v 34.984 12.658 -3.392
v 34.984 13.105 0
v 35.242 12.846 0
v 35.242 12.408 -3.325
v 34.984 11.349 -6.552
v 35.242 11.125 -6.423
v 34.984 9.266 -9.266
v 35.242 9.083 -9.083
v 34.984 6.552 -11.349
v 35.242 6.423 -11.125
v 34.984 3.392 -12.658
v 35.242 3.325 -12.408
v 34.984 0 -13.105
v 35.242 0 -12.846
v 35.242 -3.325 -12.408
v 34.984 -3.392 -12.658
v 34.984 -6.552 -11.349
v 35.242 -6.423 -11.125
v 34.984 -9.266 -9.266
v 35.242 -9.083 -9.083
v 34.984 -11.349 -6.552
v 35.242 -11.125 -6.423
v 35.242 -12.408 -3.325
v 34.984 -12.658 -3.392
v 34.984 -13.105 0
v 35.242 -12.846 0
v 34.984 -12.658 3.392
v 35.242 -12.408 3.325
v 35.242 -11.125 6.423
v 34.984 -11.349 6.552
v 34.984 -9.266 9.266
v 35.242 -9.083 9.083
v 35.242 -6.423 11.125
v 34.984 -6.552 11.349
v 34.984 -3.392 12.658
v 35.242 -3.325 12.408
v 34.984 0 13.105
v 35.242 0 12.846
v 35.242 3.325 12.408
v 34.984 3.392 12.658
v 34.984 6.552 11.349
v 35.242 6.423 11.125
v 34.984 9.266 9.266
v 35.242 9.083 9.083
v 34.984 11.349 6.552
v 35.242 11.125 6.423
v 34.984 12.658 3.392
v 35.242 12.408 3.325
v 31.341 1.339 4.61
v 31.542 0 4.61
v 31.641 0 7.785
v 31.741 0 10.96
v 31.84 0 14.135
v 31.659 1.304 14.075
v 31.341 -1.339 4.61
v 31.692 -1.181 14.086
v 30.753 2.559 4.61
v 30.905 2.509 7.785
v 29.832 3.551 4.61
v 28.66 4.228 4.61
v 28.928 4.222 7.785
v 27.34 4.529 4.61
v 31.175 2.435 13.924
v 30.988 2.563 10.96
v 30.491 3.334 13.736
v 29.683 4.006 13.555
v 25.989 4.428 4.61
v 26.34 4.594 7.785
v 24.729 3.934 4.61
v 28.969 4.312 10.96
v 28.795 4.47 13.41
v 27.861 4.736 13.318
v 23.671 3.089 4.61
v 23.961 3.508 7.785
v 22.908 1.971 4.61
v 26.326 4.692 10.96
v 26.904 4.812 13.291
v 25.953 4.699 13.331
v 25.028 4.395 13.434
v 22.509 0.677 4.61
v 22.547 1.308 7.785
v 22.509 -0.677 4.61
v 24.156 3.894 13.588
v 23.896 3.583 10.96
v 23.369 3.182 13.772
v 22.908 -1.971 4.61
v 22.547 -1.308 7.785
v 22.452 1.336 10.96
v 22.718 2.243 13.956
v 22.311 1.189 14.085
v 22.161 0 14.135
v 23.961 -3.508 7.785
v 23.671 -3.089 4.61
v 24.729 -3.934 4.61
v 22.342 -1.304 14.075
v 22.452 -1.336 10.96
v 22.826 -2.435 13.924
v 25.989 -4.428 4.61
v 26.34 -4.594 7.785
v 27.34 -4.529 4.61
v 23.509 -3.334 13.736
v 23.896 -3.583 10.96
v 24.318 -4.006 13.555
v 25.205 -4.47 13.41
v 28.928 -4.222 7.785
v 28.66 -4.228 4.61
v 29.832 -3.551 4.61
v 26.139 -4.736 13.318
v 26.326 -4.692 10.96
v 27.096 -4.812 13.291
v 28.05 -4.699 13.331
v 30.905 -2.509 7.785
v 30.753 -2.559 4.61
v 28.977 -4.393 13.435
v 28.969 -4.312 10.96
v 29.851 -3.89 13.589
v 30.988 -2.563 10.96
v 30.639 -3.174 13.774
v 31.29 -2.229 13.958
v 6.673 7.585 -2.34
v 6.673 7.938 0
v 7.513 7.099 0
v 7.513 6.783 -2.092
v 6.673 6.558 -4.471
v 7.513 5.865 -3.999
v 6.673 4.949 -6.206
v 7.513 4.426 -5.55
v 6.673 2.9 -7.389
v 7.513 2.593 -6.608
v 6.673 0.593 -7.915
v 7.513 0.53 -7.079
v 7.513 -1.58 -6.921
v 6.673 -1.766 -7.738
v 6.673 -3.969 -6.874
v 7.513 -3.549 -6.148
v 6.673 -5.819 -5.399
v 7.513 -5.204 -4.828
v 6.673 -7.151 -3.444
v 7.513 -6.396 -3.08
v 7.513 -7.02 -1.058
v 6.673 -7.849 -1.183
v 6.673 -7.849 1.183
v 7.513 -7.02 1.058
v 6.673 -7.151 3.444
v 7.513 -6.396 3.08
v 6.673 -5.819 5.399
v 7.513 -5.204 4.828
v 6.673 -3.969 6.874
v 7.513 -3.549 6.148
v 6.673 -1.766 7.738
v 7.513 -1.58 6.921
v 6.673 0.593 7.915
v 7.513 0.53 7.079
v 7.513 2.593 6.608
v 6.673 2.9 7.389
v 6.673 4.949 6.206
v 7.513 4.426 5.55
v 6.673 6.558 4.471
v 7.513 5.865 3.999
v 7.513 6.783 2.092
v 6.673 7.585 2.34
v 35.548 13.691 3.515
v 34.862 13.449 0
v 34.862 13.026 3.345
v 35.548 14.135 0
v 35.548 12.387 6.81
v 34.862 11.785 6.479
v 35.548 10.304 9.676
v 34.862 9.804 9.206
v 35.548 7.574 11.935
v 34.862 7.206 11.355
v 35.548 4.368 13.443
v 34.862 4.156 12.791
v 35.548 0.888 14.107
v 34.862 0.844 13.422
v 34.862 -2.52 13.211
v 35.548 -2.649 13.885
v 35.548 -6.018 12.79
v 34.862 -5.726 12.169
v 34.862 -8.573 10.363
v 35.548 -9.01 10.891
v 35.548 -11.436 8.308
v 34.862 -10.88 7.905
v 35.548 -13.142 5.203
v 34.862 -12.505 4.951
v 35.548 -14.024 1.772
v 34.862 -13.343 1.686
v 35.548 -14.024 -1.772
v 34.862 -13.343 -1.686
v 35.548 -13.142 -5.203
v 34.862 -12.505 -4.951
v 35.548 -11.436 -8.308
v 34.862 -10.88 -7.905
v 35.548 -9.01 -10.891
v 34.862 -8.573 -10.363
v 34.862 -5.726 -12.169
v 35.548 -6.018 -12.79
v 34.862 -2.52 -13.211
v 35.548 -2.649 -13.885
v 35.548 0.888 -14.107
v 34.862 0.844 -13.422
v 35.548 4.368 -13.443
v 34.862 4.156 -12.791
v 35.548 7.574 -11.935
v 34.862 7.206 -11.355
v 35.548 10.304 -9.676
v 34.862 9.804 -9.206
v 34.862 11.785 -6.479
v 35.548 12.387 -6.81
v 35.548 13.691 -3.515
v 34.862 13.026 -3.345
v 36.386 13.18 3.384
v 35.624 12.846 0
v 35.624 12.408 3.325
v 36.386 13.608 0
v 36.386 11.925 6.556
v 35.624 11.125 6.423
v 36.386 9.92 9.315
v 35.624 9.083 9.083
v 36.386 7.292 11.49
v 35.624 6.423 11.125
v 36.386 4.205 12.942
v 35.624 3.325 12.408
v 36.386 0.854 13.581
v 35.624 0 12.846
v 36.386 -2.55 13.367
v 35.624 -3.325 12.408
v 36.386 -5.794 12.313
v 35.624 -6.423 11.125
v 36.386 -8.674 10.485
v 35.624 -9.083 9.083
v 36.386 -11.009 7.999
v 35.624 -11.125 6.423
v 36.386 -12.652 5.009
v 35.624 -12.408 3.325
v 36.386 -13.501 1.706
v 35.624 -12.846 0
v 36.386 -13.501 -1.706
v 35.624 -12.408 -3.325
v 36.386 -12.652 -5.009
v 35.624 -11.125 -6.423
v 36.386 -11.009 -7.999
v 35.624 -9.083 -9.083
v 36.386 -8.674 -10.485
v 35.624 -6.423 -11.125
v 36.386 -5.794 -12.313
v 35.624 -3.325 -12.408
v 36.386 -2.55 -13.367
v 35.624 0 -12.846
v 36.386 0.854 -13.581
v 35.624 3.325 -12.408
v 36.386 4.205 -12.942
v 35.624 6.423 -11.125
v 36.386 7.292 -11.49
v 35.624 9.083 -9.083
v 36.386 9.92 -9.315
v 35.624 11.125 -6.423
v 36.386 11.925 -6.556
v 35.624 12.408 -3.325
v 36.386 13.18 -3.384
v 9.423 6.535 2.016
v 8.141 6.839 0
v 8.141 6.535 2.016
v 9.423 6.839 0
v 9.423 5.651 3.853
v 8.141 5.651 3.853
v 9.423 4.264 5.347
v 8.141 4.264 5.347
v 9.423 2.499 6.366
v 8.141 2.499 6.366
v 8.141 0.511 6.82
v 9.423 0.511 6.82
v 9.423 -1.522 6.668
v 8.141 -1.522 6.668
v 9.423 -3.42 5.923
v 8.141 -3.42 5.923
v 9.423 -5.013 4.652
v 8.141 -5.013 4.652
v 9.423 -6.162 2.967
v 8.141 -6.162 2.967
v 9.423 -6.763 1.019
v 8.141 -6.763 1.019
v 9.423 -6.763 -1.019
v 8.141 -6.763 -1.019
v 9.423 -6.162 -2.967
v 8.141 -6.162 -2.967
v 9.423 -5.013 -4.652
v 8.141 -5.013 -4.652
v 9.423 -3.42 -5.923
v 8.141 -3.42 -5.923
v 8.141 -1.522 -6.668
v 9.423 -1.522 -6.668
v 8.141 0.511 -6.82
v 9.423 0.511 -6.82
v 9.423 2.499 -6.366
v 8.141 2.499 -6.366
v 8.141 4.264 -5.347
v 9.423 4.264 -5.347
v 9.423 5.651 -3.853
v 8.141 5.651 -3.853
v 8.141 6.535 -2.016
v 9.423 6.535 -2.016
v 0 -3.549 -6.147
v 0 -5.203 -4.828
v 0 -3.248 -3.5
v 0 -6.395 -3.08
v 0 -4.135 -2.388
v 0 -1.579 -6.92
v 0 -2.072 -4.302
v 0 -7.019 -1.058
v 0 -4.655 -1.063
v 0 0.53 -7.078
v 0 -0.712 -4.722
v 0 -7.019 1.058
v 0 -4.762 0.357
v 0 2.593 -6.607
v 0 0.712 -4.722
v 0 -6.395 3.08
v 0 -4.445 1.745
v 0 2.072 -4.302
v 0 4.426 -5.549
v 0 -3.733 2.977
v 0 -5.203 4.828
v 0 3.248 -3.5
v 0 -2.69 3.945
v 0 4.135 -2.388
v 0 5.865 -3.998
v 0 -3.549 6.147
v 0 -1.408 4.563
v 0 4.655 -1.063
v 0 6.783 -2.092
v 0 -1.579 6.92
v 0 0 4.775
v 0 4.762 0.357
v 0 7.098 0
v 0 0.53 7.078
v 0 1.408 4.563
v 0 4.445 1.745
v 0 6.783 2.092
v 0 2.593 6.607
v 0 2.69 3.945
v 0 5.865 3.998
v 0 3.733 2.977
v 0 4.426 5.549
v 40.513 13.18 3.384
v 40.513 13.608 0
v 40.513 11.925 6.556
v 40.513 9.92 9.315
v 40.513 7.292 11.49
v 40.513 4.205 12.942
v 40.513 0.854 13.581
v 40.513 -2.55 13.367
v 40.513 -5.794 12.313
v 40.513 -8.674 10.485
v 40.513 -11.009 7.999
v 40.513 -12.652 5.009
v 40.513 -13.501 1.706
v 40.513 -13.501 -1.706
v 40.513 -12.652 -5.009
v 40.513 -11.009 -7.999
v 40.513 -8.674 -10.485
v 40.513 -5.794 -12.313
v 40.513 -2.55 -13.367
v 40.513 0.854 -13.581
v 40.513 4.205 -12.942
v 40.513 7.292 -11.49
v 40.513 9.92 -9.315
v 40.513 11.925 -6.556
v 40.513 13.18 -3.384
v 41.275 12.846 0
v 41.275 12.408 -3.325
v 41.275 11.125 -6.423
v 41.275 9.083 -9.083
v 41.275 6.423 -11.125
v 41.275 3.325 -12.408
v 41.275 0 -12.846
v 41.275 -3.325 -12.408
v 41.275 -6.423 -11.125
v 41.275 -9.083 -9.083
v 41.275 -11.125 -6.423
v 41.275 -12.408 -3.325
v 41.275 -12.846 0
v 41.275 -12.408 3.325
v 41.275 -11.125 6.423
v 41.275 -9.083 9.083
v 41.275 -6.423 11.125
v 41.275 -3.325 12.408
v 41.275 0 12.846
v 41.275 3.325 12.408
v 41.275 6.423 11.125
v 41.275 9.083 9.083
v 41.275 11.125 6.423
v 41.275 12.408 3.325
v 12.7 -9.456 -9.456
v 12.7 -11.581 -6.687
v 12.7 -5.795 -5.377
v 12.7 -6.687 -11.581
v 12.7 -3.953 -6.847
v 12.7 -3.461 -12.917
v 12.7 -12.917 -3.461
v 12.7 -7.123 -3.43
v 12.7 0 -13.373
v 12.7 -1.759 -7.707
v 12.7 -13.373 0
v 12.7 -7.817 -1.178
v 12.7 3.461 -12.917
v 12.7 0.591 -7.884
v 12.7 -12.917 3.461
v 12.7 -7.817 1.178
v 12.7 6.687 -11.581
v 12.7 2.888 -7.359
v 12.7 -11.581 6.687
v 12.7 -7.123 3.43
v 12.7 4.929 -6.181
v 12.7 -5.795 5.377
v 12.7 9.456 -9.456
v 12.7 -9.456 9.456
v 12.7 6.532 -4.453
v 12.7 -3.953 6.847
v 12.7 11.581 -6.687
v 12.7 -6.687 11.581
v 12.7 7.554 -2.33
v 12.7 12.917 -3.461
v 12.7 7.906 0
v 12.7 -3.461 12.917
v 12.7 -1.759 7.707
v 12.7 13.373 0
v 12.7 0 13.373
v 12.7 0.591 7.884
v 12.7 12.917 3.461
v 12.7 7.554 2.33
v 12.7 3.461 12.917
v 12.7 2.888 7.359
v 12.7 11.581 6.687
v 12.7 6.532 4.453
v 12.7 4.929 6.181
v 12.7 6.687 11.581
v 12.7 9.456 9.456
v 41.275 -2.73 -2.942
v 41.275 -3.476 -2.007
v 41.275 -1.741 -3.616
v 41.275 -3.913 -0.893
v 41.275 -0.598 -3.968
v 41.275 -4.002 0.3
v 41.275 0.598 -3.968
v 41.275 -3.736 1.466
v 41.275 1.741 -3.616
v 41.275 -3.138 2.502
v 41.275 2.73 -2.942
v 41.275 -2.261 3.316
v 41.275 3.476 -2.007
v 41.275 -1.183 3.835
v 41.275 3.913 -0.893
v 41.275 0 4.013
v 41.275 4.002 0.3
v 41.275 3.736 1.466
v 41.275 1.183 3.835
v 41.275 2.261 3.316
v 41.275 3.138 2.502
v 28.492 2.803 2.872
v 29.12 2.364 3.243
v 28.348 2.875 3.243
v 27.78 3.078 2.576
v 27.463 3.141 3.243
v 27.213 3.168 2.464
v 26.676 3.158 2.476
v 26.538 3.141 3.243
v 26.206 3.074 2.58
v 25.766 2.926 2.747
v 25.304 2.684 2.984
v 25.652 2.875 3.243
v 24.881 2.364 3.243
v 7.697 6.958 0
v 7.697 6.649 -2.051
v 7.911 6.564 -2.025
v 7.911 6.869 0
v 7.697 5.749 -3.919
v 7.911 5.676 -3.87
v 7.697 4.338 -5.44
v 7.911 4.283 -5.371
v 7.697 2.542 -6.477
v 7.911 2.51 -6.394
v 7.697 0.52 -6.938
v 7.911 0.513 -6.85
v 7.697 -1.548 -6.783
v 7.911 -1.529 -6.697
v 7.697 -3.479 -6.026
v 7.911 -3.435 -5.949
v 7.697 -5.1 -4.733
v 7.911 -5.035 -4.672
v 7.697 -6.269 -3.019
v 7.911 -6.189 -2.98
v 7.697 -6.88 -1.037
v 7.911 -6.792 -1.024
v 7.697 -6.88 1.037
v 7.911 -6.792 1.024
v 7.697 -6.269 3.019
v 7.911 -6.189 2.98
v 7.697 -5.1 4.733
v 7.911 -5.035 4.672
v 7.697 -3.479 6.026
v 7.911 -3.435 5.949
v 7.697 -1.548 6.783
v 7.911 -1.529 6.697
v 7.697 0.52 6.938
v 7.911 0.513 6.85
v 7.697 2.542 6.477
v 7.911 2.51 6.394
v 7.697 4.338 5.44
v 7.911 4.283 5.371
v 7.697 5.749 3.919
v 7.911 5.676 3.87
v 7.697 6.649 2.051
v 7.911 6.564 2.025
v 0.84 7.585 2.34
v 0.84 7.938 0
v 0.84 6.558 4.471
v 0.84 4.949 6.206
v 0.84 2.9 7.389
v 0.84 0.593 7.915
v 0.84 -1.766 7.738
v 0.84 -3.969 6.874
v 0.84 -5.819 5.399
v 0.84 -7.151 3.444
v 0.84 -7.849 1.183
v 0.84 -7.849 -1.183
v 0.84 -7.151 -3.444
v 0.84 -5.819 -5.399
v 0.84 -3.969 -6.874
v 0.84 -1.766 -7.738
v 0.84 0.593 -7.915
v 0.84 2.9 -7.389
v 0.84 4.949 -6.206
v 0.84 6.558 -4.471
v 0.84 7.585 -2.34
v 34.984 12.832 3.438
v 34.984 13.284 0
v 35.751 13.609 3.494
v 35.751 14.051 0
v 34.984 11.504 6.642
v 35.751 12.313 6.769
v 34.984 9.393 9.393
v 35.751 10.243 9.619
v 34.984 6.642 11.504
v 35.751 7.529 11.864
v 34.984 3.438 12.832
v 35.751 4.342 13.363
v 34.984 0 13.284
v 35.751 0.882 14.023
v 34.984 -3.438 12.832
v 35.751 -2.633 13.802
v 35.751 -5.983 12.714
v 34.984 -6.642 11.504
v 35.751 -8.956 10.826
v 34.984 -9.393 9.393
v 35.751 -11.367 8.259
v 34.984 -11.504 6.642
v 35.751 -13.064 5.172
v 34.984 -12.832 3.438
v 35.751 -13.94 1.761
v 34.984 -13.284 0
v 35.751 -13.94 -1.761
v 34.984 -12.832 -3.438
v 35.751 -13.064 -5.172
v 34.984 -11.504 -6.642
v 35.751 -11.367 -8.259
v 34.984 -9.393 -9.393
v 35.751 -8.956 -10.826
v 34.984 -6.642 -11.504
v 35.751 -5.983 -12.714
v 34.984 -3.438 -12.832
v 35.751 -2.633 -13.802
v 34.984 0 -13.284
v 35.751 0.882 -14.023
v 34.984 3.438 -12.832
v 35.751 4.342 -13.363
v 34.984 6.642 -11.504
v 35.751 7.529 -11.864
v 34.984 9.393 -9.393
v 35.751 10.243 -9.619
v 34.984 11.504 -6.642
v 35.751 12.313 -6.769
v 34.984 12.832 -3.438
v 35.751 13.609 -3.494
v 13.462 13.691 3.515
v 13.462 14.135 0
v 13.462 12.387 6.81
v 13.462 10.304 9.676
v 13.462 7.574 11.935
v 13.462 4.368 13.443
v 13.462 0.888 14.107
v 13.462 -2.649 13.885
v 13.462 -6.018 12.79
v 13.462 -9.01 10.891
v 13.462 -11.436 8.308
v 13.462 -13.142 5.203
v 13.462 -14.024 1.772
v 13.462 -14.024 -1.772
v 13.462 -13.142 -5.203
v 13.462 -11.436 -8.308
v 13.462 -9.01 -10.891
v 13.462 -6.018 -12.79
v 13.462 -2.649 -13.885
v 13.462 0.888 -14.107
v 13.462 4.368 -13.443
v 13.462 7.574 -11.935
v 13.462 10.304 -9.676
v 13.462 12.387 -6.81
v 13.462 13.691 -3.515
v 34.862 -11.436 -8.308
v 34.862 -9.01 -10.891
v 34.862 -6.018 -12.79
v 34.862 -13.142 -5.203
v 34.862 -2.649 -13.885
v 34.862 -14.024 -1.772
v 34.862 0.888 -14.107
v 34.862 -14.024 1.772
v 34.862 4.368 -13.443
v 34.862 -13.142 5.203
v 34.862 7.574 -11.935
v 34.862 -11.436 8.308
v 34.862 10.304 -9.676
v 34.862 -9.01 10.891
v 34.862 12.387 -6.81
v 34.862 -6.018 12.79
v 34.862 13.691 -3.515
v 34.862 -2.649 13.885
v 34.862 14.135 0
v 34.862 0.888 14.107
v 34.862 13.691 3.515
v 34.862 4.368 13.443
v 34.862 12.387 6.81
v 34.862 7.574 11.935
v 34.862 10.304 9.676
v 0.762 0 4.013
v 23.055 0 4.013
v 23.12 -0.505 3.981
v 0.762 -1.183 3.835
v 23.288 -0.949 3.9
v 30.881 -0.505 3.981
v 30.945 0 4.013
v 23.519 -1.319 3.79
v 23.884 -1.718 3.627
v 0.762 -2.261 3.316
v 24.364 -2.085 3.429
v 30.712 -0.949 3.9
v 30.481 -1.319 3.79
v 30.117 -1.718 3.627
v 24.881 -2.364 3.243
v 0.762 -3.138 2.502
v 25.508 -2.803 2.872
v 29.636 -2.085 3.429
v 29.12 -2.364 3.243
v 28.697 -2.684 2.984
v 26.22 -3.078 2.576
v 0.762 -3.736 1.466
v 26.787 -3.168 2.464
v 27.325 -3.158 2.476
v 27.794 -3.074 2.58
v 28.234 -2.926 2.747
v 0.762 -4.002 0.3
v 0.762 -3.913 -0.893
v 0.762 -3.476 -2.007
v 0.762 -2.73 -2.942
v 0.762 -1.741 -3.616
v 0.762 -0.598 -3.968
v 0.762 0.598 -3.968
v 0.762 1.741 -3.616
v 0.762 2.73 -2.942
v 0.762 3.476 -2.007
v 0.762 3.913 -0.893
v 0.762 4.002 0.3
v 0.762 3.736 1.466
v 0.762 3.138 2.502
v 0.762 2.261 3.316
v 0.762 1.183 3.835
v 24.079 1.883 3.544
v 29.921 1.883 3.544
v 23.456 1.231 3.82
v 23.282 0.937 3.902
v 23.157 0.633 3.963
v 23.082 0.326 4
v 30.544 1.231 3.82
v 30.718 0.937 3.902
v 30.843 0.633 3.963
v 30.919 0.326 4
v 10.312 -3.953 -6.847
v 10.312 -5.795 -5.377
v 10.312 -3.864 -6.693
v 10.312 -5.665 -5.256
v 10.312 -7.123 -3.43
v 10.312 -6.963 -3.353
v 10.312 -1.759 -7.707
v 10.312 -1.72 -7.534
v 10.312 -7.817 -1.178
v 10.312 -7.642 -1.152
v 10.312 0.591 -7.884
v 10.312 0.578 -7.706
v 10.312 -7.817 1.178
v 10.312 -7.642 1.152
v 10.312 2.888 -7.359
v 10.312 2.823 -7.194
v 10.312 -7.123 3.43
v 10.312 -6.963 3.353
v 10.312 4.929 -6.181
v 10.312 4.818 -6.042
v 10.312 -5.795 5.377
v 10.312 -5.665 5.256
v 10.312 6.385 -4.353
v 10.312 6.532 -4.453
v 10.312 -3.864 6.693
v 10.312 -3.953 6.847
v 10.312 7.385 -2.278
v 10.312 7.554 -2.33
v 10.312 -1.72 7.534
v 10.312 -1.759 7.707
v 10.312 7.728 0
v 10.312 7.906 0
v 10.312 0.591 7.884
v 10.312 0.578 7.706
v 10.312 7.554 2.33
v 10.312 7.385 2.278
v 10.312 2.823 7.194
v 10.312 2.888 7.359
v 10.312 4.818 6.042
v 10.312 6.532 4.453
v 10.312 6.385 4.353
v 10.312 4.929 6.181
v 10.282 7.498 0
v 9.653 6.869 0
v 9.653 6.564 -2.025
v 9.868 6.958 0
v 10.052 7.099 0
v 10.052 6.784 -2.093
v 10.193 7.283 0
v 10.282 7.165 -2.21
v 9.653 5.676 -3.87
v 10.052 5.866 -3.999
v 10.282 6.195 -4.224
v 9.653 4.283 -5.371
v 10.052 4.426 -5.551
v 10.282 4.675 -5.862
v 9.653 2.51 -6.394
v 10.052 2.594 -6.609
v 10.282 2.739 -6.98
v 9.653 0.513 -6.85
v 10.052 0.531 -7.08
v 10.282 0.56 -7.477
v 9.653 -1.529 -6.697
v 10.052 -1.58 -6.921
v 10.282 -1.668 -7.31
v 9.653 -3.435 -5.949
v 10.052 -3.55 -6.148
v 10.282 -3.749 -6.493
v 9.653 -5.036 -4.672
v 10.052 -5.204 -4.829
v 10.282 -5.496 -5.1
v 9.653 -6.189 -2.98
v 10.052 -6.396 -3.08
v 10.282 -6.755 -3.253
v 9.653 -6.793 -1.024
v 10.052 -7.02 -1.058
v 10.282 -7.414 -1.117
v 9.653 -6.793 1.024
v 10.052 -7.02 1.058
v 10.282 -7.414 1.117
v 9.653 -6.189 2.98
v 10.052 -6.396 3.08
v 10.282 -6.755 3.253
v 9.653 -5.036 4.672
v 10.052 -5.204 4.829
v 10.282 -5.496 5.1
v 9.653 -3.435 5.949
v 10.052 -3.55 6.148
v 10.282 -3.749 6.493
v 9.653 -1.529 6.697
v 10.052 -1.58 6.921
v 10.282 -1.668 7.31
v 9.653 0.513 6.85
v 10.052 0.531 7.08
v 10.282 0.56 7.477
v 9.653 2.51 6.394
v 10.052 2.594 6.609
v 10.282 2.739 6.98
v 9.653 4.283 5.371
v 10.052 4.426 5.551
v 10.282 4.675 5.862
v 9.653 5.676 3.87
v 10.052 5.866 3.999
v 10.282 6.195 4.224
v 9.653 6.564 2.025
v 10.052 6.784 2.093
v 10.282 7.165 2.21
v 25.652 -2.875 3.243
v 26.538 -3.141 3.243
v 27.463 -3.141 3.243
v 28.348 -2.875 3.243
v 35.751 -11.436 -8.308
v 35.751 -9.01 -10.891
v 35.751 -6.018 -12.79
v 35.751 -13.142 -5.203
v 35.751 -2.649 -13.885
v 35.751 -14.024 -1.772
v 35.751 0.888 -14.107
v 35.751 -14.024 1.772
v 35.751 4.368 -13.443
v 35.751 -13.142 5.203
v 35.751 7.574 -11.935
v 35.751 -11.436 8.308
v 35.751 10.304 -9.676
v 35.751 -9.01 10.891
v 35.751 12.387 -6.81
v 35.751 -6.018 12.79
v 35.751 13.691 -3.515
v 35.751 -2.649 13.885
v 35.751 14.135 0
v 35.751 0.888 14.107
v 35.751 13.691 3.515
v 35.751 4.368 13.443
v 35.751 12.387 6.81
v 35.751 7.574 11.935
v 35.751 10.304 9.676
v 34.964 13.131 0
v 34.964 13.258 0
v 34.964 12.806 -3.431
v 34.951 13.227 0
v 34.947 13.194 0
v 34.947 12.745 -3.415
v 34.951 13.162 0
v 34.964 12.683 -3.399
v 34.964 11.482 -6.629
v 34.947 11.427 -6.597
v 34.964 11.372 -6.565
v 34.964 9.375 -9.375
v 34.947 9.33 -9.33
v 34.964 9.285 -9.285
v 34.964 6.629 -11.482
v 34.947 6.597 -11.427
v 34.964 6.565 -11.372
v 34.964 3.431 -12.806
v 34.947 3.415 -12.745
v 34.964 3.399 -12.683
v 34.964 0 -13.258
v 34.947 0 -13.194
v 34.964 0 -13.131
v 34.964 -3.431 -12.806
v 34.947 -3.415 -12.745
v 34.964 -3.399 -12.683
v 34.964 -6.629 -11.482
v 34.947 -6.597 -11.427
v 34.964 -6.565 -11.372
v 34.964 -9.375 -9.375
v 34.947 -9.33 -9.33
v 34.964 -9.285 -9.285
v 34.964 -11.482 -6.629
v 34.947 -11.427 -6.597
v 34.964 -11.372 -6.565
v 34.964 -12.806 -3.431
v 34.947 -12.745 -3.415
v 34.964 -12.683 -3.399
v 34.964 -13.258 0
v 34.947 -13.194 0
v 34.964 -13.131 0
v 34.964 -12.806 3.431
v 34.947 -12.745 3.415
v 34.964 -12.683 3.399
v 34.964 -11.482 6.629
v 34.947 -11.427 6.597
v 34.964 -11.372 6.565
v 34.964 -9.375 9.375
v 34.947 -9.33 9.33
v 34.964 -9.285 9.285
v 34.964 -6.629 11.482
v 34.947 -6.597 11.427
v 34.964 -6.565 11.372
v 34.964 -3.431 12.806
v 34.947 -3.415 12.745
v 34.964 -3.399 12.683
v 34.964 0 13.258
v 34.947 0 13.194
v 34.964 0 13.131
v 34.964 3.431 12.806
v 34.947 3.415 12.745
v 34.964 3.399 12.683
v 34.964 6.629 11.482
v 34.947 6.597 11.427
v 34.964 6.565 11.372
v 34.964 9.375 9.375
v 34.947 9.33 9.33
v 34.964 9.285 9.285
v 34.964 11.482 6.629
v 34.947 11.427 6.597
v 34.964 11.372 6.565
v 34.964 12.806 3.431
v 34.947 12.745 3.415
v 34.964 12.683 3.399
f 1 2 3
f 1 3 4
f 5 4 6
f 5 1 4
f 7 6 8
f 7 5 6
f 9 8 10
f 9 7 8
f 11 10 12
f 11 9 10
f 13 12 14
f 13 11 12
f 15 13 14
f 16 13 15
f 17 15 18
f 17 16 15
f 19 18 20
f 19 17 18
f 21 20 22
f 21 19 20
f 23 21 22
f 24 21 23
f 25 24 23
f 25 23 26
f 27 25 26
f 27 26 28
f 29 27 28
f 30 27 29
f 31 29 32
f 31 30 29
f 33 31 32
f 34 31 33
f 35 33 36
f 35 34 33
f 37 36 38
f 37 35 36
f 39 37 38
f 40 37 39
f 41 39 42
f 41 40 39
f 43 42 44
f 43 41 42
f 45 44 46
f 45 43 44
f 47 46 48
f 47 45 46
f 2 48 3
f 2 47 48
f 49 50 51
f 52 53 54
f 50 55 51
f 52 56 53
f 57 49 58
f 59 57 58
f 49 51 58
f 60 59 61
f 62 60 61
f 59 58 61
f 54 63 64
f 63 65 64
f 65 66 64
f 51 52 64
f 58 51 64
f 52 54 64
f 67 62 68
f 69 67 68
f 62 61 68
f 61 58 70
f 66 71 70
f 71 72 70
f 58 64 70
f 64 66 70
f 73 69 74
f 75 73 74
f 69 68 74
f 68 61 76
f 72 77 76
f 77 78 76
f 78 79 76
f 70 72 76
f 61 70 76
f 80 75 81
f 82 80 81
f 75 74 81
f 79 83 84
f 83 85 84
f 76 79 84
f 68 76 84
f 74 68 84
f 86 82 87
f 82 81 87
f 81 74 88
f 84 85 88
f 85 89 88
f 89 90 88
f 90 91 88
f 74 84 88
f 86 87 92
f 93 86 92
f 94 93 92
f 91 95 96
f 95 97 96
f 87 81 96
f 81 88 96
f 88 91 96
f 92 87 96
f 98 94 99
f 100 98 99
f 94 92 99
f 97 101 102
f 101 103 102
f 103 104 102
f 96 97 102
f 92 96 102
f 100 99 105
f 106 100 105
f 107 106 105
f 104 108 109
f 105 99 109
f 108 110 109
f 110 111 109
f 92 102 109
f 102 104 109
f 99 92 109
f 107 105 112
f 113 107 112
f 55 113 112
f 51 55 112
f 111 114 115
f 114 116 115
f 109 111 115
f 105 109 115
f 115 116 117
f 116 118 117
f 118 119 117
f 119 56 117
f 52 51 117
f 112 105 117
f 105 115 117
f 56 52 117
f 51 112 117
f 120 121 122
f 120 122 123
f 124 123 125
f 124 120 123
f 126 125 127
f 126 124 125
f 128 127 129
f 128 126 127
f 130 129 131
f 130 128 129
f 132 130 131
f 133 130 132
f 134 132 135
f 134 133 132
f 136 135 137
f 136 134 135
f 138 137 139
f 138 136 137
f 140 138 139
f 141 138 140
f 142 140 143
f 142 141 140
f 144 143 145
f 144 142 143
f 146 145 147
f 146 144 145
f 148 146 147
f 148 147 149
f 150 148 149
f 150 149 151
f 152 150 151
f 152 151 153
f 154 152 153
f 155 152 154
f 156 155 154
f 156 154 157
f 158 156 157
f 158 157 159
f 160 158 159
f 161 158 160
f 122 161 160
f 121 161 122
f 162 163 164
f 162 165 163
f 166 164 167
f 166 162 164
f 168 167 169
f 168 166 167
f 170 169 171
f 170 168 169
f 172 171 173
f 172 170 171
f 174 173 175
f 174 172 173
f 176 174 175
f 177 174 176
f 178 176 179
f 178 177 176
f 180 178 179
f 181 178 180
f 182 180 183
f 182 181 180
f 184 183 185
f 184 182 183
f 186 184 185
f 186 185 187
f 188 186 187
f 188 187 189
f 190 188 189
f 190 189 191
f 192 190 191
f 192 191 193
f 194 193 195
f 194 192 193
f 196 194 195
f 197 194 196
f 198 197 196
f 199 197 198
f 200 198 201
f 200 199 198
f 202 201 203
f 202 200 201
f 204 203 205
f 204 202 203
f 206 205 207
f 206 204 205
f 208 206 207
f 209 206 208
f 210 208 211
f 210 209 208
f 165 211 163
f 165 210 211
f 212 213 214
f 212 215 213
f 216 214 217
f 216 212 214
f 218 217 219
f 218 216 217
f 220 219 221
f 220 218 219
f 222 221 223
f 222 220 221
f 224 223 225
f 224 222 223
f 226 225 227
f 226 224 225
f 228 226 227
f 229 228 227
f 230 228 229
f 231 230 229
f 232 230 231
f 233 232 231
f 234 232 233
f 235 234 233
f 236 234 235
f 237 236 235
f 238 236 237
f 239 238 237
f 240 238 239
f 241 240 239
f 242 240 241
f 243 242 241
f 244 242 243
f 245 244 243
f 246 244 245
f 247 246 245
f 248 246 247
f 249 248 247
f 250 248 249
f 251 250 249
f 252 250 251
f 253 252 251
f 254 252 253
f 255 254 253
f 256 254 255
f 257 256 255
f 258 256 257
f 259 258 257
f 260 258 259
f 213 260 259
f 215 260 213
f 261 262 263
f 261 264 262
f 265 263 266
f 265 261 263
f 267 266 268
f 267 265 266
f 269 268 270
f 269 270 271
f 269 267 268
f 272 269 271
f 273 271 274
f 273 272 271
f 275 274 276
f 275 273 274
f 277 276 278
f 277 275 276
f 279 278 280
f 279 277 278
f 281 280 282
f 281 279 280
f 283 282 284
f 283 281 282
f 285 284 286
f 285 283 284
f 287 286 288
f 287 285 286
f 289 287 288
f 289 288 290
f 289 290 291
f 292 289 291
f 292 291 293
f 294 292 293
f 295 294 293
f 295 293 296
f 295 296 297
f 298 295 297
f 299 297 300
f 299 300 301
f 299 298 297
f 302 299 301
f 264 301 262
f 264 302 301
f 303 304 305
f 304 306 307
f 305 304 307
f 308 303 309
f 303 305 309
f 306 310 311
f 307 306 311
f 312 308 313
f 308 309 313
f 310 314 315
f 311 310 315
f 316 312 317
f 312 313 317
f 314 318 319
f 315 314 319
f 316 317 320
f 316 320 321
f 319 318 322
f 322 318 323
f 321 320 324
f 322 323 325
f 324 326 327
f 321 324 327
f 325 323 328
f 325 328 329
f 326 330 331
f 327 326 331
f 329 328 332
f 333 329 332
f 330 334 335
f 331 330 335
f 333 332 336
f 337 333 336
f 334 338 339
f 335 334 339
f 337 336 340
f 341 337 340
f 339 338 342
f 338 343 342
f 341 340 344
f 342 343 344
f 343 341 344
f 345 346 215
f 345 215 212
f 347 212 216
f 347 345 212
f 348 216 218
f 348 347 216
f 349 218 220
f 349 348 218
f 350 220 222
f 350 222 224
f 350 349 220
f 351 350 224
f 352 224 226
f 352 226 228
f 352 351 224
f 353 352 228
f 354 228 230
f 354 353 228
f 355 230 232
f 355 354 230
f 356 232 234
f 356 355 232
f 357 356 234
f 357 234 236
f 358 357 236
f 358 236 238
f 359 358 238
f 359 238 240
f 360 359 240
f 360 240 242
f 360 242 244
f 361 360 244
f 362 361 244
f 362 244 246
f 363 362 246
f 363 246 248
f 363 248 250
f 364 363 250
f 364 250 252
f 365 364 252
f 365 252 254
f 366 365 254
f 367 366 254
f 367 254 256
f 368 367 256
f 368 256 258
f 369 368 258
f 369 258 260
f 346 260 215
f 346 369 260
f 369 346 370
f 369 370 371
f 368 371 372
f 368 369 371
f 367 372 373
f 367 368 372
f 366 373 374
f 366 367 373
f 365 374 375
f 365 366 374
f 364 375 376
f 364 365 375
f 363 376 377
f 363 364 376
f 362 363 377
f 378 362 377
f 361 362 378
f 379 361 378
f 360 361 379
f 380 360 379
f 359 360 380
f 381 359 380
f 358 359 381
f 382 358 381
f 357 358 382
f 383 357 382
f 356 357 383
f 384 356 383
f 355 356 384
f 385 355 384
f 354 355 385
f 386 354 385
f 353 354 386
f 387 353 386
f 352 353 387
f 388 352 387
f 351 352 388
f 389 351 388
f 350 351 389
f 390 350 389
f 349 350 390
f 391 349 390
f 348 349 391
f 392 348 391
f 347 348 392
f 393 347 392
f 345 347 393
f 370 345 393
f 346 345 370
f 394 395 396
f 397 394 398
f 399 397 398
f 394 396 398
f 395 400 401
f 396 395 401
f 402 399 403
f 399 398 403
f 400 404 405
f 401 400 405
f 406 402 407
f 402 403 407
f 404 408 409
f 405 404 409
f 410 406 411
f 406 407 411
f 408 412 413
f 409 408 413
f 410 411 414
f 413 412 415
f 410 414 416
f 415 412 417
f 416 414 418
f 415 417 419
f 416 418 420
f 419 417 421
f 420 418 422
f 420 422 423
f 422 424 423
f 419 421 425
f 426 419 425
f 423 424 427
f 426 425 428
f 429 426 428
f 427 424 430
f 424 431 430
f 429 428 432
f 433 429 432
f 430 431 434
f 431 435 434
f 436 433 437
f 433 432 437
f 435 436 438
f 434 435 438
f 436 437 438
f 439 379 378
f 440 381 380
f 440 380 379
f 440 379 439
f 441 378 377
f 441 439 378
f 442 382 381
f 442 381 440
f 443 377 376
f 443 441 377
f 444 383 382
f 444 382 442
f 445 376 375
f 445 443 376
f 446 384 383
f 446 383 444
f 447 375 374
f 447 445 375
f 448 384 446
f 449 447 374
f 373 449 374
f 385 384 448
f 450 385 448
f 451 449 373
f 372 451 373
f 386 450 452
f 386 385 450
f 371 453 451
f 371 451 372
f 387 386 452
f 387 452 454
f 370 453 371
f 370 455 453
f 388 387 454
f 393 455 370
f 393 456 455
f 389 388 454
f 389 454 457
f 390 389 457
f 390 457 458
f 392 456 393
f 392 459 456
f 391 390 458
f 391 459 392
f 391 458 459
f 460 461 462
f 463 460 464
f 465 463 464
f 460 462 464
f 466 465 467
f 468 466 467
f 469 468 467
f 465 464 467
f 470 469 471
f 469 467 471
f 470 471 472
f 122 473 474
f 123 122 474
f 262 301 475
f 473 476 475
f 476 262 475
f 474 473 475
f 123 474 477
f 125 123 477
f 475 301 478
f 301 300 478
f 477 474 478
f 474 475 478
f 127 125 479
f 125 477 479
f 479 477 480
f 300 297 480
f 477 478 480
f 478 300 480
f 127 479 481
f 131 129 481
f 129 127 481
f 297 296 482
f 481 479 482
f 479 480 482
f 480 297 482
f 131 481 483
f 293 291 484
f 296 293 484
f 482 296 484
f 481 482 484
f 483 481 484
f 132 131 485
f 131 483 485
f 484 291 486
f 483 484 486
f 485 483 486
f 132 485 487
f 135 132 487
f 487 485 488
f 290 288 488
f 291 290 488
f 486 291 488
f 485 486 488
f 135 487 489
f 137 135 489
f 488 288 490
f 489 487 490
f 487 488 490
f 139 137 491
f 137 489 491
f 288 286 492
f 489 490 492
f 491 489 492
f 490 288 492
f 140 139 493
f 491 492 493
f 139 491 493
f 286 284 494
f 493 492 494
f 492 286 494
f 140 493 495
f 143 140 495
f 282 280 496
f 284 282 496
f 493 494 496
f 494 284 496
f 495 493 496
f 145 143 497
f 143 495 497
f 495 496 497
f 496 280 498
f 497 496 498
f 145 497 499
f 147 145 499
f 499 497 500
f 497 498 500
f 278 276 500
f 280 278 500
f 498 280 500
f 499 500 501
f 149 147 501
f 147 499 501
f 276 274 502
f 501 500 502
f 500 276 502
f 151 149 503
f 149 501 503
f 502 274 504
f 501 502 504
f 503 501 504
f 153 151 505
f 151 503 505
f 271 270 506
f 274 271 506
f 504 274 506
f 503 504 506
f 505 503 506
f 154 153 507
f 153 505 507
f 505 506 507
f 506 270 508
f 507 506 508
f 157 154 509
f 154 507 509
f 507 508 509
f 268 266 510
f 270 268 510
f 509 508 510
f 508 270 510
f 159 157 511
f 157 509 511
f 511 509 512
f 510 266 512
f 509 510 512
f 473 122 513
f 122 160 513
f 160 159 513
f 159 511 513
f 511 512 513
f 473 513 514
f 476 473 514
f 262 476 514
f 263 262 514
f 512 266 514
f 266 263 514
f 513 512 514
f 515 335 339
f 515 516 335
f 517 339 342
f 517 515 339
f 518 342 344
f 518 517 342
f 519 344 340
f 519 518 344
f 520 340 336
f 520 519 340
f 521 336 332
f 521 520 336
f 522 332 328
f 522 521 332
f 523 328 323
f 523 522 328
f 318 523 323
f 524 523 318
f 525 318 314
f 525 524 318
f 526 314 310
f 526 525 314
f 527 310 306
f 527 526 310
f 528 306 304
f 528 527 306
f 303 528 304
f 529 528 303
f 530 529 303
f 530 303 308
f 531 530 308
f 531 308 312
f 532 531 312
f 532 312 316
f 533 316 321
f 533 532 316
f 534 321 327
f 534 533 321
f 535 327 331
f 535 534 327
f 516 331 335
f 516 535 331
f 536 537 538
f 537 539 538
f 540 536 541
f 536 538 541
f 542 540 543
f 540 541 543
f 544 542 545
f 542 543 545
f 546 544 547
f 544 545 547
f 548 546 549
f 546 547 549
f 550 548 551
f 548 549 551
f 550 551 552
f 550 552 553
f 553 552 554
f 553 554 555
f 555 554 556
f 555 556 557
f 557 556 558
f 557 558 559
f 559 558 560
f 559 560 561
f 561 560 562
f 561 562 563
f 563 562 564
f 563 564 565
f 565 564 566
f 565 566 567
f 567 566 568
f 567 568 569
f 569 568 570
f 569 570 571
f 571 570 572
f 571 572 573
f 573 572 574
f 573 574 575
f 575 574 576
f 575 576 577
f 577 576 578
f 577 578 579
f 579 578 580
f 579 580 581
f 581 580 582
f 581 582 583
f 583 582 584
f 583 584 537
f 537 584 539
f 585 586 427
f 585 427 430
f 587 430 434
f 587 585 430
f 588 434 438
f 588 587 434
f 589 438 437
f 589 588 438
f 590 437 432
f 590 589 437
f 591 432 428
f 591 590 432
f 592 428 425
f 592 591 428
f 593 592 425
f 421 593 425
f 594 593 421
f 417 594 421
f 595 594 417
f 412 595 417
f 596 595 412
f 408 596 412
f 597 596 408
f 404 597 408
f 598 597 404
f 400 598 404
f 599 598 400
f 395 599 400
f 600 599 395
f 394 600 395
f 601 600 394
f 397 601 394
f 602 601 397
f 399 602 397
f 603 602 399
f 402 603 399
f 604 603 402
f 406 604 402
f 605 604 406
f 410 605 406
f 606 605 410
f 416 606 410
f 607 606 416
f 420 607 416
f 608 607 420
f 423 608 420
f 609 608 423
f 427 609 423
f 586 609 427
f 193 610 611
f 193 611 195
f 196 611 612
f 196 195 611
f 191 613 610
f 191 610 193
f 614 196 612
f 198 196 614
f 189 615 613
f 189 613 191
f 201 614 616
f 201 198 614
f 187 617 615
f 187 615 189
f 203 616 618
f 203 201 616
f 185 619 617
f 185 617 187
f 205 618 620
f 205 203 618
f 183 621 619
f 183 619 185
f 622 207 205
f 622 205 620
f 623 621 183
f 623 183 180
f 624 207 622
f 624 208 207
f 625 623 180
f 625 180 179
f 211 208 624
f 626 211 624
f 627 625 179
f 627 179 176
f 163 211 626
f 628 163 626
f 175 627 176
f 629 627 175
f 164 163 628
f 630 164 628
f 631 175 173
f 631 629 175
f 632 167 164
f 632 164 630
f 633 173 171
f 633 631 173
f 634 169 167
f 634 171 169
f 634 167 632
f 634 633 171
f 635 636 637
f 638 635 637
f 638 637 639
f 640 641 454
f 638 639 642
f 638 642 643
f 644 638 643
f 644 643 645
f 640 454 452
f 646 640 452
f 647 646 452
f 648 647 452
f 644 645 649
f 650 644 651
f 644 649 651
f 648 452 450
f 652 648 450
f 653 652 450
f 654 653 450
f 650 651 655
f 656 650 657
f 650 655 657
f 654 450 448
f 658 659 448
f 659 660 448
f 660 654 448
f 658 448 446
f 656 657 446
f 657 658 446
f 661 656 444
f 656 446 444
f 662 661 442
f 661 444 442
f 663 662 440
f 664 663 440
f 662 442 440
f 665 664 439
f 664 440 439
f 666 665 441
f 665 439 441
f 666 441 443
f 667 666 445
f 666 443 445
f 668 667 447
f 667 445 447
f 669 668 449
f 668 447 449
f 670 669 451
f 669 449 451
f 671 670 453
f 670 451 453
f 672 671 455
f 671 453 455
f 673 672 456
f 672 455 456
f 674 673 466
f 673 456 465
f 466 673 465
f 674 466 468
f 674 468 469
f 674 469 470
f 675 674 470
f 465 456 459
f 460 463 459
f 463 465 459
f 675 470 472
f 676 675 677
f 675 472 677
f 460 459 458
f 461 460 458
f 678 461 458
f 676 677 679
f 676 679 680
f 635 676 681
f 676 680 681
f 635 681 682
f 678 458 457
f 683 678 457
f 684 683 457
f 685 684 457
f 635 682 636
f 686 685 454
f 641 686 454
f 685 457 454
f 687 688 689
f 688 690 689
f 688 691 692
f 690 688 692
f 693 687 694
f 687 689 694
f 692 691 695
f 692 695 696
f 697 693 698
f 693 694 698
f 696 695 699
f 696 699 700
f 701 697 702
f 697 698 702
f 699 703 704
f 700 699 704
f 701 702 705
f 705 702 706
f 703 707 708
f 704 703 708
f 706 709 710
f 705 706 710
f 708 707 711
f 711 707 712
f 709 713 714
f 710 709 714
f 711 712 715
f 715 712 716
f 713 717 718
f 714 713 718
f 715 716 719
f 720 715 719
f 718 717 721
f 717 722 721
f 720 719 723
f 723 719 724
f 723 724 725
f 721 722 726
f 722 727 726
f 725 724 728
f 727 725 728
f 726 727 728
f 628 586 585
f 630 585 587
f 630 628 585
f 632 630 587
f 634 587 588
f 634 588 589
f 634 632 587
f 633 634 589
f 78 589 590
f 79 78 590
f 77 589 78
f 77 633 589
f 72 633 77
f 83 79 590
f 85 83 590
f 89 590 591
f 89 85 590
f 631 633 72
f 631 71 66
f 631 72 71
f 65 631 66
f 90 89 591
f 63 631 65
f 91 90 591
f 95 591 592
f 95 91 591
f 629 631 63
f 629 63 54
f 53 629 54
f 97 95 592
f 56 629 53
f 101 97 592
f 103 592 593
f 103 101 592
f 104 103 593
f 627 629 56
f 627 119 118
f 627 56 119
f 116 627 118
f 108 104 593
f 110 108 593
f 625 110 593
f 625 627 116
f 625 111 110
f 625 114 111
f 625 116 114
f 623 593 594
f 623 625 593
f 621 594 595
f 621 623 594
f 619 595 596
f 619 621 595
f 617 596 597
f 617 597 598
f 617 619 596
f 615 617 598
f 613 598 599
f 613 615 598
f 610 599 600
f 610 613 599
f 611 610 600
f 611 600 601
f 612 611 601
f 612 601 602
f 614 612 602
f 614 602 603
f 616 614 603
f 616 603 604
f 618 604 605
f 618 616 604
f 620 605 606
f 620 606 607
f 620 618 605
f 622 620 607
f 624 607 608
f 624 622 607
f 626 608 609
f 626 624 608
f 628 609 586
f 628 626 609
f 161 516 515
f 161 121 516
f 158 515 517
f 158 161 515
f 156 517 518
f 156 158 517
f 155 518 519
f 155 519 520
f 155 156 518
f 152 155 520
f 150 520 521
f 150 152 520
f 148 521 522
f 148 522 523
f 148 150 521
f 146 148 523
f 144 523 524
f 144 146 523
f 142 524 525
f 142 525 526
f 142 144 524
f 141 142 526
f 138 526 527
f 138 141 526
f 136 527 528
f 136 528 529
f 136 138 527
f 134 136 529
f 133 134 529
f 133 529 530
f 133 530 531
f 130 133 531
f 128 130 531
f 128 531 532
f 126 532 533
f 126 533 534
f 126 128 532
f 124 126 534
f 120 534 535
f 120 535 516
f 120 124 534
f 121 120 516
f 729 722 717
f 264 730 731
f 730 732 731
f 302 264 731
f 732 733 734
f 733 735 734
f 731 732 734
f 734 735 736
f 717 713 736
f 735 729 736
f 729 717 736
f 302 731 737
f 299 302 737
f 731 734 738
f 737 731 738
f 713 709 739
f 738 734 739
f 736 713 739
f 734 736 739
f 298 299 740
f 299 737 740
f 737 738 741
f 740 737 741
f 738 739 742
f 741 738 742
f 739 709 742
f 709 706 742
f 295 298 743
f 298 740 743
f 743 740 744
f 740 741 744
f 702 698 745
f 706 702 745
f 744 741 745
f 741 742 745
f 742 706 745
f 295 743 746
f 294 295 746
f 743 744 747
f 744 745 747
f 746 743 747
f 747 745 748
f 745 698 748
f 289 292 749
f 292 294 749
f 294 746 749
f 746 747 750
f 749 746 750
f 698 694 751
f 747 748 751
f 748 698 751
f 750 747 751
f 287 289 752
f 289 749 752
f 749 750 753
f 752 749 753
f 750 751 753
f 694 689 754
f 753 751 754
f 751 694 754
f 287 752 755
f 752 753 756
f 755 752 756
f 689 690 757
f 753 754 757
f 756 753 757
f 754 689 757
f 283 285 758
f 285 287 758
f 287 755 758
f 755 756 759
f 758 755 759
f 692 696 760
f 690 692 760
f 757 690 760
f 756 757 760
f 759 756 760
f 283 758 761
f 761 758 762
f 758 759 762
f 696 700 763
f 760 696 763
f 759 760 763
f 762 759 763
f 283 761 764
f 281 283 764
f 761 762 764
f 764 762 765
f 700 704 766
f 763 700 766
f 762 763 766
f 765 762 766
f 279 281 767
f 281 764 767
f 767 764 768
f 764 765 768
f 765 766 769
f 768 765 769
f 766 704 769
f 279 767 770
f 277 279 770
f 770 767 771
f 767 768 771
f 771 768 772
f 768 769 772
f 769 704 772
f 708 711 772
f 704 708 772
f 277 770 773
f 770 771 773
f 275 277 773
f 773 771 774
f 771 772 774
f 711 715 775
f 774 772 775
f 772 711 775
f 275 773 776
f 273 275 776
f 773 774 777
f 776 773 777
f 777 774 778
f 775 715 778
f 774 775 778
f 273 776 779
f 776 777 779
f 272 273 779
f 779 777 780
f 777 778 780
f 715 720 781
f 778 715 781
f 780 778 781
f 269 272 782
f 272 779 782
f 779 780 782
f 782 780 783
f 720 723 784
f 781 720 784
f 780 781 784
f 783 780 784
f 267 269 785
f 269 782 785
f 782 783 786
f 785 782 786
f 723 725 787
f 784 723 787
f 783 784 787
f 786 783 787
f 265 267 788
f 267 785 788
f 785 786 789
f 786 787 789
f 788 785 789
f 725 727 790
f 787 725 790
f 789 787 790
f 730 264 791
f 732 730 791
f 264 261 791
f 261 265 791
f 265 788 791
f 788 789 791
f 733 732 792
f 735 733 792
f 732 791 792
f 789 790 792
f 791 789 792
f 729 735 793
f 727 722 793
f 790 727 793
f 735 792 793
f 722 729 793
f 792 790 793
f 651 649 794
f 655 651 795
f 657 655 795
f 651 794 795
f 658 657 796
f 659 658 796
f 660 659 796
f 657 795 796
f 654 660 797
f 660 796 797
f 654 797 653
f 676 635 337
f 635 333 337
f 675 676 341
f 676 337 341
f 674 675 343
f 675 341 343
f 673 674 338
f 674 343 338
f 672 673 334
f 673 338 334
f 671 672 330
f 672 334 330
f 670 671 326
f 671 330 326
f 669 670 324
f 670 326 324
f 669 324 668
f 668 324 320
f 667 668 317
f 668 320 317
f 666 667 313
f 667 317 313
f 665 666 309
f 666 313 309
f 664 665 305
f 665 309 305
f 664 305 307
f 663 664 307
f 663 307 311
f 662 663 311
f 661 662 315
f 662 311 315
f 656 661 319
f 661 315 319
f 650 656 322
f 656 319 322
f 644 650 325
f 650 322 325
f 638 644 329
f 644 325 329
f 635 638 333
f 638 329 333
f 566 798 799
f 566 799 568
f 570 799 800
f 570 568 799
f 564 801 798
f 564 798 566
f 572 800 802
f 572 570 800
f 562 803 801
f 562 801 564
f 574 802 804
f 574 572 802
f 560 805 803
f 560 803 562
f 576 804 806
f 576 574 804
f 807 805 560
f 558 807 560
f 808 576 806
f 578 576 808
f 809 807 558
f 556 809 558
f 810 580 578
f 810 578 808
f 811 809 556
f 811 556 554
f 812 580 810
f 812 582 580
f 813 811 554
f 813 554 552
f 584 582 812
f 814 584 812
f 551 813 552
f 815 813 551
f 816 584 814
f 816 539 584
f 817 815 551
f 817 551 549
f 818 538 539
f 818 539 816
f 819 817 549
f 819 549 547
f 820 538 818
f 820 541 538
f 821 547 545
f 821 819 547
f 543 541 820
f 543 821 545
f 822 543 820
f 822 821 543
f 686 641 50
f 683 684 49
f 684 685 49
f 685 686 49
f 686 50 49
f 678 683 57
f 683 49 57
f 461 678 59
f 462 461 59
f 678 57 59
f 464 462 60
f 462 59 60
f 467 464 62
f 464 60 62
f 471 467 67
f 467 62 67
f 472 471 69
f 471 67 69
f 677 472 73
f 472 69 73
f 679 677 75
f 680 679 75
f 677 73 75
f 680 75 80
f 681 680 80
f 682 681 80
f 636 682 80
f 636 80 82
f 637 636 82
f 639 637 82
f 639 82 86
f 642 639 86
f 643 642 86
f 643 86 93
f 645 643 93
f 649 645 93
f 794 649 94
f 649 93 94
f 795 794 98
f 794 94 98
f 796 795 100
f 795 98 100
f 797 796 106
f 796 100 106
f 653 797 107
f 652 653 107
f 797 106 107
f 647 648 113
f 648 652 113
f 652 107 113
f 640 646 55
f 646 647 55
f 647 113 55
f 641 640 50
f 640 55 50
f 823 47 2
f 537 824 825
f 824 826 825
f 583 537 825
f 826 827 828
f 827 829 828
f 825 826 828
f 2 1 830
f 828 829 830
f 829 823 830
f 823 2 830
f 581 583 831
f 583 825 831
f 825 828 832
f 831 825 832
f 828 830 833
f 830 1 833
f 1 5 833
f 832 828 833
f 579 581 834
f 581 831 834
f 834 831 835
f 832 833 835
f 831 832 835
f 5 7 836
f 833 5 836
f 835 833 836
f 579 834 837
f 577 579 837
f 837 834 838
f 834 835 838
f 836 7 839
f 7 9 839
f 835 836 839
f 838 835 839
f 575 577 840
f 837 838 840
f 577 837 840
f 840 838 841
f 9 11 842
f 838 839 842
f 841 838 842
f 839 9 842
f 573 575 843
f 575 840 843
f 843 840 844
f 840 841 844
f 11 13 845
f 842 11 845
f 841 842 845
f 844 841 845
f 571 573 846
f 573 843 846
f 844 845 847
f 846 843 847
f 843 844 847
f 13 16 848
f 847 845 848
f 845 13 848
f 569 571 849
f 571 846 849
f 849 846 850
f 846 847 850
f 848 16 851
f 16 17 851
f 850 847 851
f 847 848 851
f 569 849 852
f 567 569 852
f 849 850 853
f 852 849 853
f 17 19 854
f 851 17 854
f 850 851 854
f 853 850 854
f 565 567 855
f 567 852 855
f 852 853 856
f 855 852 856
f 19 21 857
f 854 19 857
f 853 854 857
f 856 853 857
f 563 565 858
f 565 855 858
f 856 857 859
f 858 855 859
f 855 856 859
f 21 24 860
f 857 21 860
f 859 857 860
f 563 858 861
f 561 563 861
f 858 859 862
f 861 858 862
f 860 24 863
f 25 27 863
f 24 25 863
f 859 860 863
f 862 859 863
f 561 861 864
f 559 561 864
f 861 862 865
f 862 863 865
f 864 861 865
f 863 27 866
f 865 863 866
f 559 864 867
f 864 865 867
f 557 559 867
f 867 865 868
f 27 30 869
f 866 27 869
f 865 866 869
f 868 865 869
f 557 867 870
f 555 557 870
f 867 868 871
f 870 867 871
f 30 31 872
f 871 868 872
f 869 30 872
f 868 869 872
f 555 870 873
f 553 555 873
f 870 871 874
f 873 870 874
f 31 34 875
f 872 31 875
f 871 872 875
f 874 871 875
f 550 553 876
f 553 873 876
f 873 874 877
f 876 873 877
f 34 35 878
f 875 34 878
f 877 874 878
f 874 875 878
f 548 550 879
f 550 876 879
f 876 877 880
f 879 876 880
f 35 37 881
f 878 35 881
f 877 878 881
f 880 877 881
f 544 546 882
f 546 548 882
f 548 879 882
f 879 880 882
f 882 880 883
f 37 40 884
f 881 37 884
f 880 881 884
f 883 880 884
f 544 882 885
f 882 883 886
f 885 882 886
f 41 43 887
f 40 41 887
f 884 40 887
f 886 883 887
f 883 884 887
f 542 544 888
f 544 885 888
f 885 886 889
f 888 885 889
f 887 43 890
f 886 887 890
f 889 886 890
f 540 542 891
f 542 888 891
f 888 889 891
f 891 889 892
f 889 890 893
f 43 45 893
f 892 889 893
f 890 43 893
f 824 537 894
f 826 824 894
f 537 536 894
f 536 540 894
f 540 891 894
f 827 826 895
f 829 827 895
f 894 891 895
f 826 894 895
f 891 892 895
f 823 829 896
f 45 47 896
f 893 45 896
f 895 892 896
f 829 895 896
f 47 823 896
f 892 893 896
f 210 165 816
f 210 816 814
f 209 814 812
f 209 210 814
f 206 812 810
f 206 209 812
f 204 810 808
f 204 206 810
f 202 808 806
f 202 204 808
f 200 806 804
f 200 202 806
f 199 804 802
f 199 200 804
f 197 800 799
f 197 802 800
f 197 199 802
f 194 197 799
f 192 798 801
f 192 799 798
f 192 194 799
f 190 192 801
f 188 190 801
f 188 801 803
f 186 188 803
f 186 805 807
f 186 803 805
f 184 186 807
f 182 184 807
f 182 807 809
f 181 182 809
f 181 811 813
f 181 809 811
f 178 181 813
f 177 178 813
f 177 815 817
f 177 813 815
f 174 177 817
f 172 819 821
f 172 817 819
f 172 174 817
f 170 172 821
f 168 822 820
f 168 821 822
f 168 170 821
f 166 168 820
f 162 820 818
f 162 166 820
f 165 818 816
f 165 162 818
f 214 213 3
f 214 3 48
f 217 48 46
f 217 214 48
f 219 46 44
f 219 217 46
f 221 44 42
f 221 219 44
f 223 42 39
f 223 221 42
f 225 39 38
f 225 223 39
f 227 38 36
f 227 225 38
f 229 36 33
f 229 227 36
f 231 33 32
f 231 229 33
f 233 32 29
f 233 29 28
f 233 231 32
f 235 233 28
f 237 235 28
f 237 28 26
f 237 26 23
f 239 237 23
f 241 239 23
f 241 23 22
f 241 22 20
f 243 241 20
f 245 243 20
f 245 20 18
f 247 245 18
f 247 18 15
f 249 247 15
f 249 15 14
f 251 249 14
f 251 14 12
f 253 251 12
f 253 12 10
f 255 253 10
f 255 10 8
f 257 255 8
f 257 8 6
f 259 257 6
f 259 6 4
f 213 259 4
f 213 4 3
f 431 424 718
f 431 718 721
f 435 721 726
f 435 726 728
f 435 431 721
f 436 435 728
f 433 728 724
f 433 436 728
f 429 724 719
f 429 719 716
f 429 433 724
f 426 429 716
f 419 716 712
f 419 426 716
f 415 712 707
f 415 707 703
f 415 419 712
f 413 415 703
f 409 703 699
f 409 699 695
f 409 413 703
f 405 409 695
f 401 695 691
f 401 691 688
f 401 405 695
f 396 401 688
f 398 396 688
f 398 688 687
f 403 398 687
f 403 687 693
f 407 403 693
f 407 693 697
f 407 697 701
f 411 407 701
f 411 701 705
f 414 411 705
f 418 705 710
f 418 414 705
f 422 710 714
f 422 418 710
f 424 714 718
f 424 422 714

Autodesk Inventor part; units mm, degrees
sketch "Sketch_2" plane through (0, 0, 0) normal (0, 0, 1) x (1, 0, 0)
  line L0 (12.7, 0) -> (0, 0)
  line L1 (0, 0) -> (0, 7.098)
  line L2 (0, 7.098) -> (0.8395, 7.9375)
  line L3 (0.8395, 7.9375) -> (6.6726, 7.9375)
  line L4 (6.6726, 7.9375) -> (7.5126, 7.0988)
  arc A0 (7.5126, 7.0988) -> (8.1407, 6.839) centre (8.1407, 7.728) ccw
  line L5 (8.1407, 6.839) -> (9.4234, 6.839)
  arc A1 (9.4234, 6.839) -> (10.3124, 7.7279) centre (9.4234, 7.7279) ccw
  line L6 (10.3124, 7.7279) -> (10.3124, 7.9057)
  line L7 (10.3124, 7.9057) -> (12.7, 7.9057)
  line L8 (12.7, 7.9057) -> (12.7, 0)
  line L9 (12.7, 0) -> (0, 0)
revolve "Revolution1" add sketch "Sketch_2" angle 360 about axis through (12.7, 0, 0) along (1, 0, 0)
thread "Thread1" size "5/8-18 UNF" class "2A" standard "ANSI Unified Screw Threads" full length
sketch "Sketch_3" plane through (0, 0, 0) normal (0, 0, 1) x (1, 0, 0)
  line L0 (41.275, 0) -> (12.7, 0)
  line L1 (12.7, 0) -> (12.7, 13.3731)
  line L2 (12.7, 13.3731) -> (13.462, 14.1351)
  line L3 (13.462, 14.1351) -> (34.8615, 14.1351)
  line L4 (34.8615, 14.1351) -> (34.8615, 12.846)
  line L5 (34.8615, 12.846) -> (35.6235, 12.846)
  line L6 (35.6235, 12.846) -> (36.3855, 13.608)
  line L7 (36.3855, 13.608) -> (40.513, 13.608)
  line L8 (40.513, 13.608) -> (41.275, 12.846)
  line L9 (41.275, 12.846) -> (41.275, 0)
  line L10 (41.275, 0) -> (12.7, 0)
revolve "Revolution2" add sketch "Sketch_3" angle 360 about axis through (41.275, 0, 0) along (1, 0, 0)
sketch "Sketch3" plane through (0, 0, 0) normal (-1, 0, 0) x (0, 0, 1)
  point P0 (0, 0)
hole "Hole1" at (0, 0, 0) direction (1, 0, 0) diameter 8.0264 depth 41.275 countersink diameter 9.5504 countersink angle 90
sketch "Sketch_40" plane through (0, 0, 0) normal (0, 1, 0) x (-1, 0, 0)
  line L0 (-27.0002, 14.1351) -> (-27.0002, 0)
  line L1 (-27.0002, 0) -> (-30.1752, 0)
  line L2 (-30.1752, 0) -> (-30.1752, 3.243)
  line L3 (-30.1752, 3.243) -> (-31.5423, 4.6101)
  line L4 (-31.5423, 4.6101) -> (-31.8397, 14.1351)
  line L5 (-31.8397, 14.1351) -> (-27.0002, 14.1351)
  line L6 (-27.0002, 14.1351) -> (-27.0002, 0)
revolve "Revolution3" cut sketch "Sketch_40" angle 360 about axis through (27.0002, 0, 14.1351) along (0, 0, 1)
sketch "Sketch_47" plane through (0, 0, 0) normal (0, 0, 1) x (1, 0, 0)
  line L0 (35.6235, 0) -> (34.8615, 0)
  line L1 (34.8615, 12.5921) -> (35.6235, 12.5921)
  line L2 (35.6235, 12.5921) -> (35.6235, 12.846)
  line L3 (35.6235, 12.846) -> (35.2425, 12.846)
  line L4 (35.2425, 12.846) -> (34.984, 13.1046)
  arc A0 (34.984, 13.2842) -> (34.984, 13.1046) centre (35.0738, 13.1944) ccw
  line L5 (34.984, 13.2842) -> (35.7508, 14.0509)
  line L6 (35.7508, 14.0509) -> (35.7508, 14.1351)
  line L7 (35.7508, 14.1351) -> (35.5476, 14.1351)
  line L8 (35.5476, 14.1351) -> (34.8615, 13.449)
  line L9 (34.8615, 13.449) -> (34.8615, 12.5921)
revolve "Revolution4" add sketch "Sketch_47" angle 360 about axis through (35.6235, 0, 0) along (1, 0, 0)
ref_plane "dp1_XY" through (12.7, 7.9057, 0) normal (0, 0, 1) x (1, 0, 0)
ref_plane "dp1_YZ" through (12.7, 7.9057, 0) normal (1, 0, 0) x (0, 1, 0)
ref_plane "dp1_ZX" through (12.7, 7.9057, 0) normal (0, 1, 0) x (0, 0, 1)
ref_plane "dp2_XY" through (12.7, -7.9057, 0) normal (0, 0, 1) x (1, 0, 0)
ref_plane "dp2_YZ" through (12.7, -7.9057, 0) normal (1, 0, 0) x (0, 1, 0)
ref_plane "dp2_ZX" through (12.7, -7.9057, 0) normal (0, 1, 0) x (0, 0, 1)
ref_plane "port_XY" through (27.0002, 0, 0) normal (0, 0, 1) x (1, 0, 0)
ref_plane "port_YZ" through (27.0002, 0, 0) normal (1, 0, 0) x (0, 1, 0)
ref_plane "port_ZX" through (27.0002, 0, 0) normal (0, 1, 0) x (0, 0, 1)
ref_plane "rod_guide_XY" through (0, 0, 0) normal (1, 0, 0) x (0, 0, -1)
ref_plane "rod_guide_YZ" through (0, 0, 0) normal (0, 0, -1) x (0, 1, 0)
ref_plane "rod_guide_ZX" through (0, 0, 0) normal (0, 1, 0) x (1, 0, 0)
ref_plane "s1_XY" through (10.3124, 0, 0) normal (0, 0, 1) x (1, 0, 0)
ref_plane "s1_YZ" through (10.3124, 0, 0) normal (1, 0, 0) x (0, 1, 0)
ref_plane "s1_ZX" through (10.3124, 0, 0) normal (0, 1, 0) x (0, 0, 1)
ref_plane "s2_XY" through (12.7, 0, 0) normal (0, 0, 1) x (1, 0, 0)
ref_plane "s2_YZ" through (12.7, 0, 0) normal (1, 0, 0) x (0, 1, 0)
ref_plane "s2_ZX" through (12.7, 0, 0) normal (0, 1, 0) x (0, 0, 1)
ref_plane "t1_XY" through (12.7, 0, 0) normal (1, 0, 0) x (0, 0, -1)
ref_plane "t1_YZ" through (12.7, 0, 0) normal (0, 0, -1) x (0, 1, 0)
ref_plane "t1_ZX" through (12.7, 0, 0) normal (0, 1, 0) x (1, 0, 0)
ref_plane "t111_XY" through (12.7, 0, 0) normal (1, 0, 0) x (0, 0, -1)
ref_plane "t111_YZ" through (12.7, 0, 0) normal (0, 0, -1) x (0, 1, 0)
ref_plane "t111_ZX" through (12.7, 0, 0) normal (0, 1, 0) x (1, 0, 0)
ref_plane "to_foot_bracket_XY" through (12.7, 0, 0) normal (1, 0, 0) x (0, 0, -1)
ref_plane "to_foot_bracket_YZ" through (12.7, 0, 0) normal (0, 0, -1) x (0, 1, 0)
ref_plane "to_foot_bracket_ZX" through (12.7, 0, 0) normal (0, 1, 0) x (1, 0, 0)
ref_plane "to_nut_XY" through (10.3124, 0, 0) normal (1, 0, 0) x (0, 0, -1)
ref_plane "to_nut_YZ" through (10.3124, 0, 0) normal (0, 0, -1) x (0, 1, 0)
ref_plane "to_nut_ZX" through (10.3124, 0, 0) normal (0, 1, 0) x (1, 0, 0)
ref_plane "to_rod_XY" through (0, 0, 0) normal (1, 0, 0) x (0, 0, -1)
ref_plane "to_rod_YZ" through (0, 0, 0) normal (0, 0, -1) x (0, 1, 0)
ref_plane "to_rod_ZX" through (0, 0, 0) normal (0, 1, 0) x (1, 0, 0)
ref_plane "to_screw_XY" through (27.0002, 10.2743, -7.0485) normal (0, 1, 0) x (1, 0, 0)
ref_plane "to_screw_YZ" through (27.0002, 10.2743, -7.0485) normal (1, 0, 0) x (0, 0, -1)
ref_plane "to_screw_ZX" through (27.0002, 10.2743, -7.0485) normal (0, 0, -1) x (0, 1, 0)
ref_plane "to_trunnion_brackets_XY" through (18.2118, 0, 0) normal (0, 1, 0) x (1, 0, 0)
ref_plane "to_trunnion_brackets_YZ" through (18.2118, 0, 0) normal (1, 0, 0) x (0, 0, -1)
ref_plane "to_trunnion_brackets_ZX" through (18.2118, 0, 0) normal (0, 0, -1) x (0, 1, 0)
ref_plane "to_trunnion_brackets1_XY" through (18.2118, 15.875, 0) normal (0, 1, 0) x (1, 0, 0)
ref_plane "to_trunnion_brackets1_YZ" through (18.2118, 15.875, 0) normal (1, 0, 0) x (0, 0, -1)
ref_plane "to_trunnion_brackets1_ZX" through (18.2118, 15.875, 0) normal (0, 0, -1) x (0, 1, 0)
ref_plane "to_trunnion_brackets2_XY" through (18.2118, -15.875, 0) normal (0, 1, 0) x (1, 0, 0)
ref_plane "to_trunnion_brackets2_YZ" through (18.2118, -15.875, 0) normal (1, 0, 0) x (0, 0, -1)
ref_plane "to_trunnion_brackets2_ZX" through (18.2118, -15.875, 0) normal (0, 0, -1) x (0, 1, 0)
ref_plane "to_tube_XY" through (35.6235, 0, 0) normal (1, 0, 0) x (0, 0, -1)
ref_plane "to_tube_YZ" through (35.6235, 0, 0) normal (0, 0, -1) x (0, 1, 0)
ref_plane "to_tube_ZX" through (35.6235, 0, 0) normal (0, 1, 0) x (1, 0, 0)
properties part number "09R000-0_rod_guide"
